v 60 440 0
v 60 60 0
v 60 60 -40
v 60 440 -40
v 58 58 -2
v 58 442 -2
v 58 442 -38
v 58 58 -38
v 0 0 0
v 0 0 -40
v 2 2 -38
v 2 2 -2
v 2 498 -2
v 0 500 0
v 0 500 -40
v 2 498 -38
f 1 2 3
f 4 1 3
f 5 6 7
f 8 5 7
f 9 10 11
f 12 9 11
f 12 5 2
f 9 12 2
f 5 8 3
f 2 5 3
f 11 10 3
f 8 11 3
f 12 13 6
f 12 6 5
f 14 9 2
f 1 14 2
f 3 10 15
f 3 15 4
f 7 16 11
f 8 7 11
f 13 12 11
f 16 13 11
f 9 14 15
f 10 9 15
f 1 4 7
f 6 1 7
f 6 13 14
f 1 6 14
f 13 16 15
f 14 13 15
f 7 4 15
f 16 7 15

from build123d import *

# Parameters (mm, degrees)
IZIM1_W                     = 60
IZIM1_H                     = 40
IZIM1_W_2                   = 56
IZIM1_H_2                   = 36
Y_KSEKLIK_EKSTR_ZYON1_DEPTH = 500
KES_EKSTR_ZYON1_DEPTH       = 700


with BuildPart() as part:
    # Çizim1 → Yükseklik-Ekstrüzyon1 (new body)
    with BuildSketch(Plane(origin=(0, 0, 0), x_dir=(1, 0, 0), z_dir=(0, 1, 0))):
        with Locations((30, 20)):
            Rectangle(IZIM1_W, IZIM1_H)
        with Locations((30, 20)):
            Rectangle(IZIM1_W_2, IZIM1_H_2, mode=Mode.SUBTRACT)
    extrude(amount=Y_KSEKLIK_EKSTR_ZYON1_DEPTH)

    # Çizim2 → Kes-Ekstrüzyon1 (cut)
    with BuildSketch(Plane(origin=(0, 0, -40), x_dir=(-1, 0, 0), z_dir=(0, 0, -1))):
        Polygon((-60, 440), (0, 500), (-60, 500), align=None)
        Polygon((-60, 0), (0, 0), (-60, 60), align=None)
    extrude(amount=-KES_EKSTR_ZYON1_DEPTH, mode=Mode.SUBTRACT)


solid = part.part
